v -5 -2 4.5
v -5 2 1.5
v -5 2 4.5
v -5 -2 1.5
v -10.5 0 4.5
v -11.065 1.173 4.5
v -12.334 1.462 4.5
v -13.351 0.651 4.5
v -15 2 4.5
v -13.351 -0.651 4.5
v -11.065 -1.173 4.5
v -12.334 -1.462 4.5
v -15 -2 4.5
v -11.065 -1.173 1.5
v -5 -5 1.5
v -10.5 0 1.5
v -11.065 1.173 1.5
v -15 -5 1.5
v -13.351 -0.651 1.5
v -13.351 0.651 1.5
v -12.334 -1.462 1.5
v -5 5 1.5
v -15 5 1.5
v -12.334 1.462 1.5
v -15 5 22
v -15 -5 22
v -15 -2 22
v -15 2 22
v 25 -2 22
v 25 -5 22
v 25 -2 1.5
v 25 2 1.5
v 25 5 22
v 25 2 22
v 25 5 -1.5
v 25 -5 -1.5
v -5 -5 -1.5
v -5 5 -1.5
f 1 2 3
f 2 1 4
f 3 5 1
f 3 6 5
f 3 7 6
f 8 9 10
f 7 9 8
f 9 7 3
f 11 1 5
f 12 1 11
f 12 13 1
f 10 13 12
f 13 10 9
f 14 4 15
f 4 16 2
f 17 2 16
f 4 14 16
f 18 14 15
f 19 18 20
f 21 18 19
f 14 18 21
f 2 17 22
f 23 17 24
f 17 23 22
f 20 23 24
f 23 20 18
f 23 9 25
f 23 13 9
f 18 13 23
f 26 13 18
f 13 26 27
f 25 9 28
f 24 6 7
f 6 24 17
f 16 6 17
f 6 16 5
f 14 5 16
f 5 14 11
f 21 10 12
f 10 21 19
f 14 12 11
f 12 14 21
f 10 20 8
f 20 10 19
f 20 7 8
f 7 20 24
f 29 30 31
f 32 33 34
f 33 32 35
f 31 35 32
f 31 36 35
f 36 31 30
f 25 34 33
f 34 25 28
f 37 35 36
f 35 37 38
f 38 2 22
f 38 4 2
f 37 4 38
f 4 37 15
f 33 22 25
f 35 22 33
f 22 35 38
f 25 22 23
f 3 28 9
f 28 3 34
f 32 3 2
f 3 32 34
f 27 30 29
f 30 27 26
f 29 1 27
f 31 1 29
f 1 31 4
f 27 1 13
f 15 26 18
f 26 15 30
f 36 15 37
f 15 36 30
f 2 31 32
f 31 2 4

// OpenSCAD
//middle segment
translate([10,3.5,10.25])cube([30,3,23.5],center=true);
translate([10,-3.5,10.25])cube([30,3,23.5],center=true);// x translate=1/2cubelength-5
translate([10,0,0])cube([30,7,3],center=true);


//attach | end segment
difference(){
    translate([-10,0,3])cube([10,7,3],center=true);//yaw servo screw is 5mm above base of yaw: thickness 2 so shift 5-2 up
    translate([-12,0,1])cylinder(h=4, d=3, $fn=7);
}
//walls of end segment
translate([-10,-3.5,7.5+5-0.75])cube([10,3,9+11.5],center=true);
translate([-10,3.5,11.75])cube([10,3,20.5],center=true);
